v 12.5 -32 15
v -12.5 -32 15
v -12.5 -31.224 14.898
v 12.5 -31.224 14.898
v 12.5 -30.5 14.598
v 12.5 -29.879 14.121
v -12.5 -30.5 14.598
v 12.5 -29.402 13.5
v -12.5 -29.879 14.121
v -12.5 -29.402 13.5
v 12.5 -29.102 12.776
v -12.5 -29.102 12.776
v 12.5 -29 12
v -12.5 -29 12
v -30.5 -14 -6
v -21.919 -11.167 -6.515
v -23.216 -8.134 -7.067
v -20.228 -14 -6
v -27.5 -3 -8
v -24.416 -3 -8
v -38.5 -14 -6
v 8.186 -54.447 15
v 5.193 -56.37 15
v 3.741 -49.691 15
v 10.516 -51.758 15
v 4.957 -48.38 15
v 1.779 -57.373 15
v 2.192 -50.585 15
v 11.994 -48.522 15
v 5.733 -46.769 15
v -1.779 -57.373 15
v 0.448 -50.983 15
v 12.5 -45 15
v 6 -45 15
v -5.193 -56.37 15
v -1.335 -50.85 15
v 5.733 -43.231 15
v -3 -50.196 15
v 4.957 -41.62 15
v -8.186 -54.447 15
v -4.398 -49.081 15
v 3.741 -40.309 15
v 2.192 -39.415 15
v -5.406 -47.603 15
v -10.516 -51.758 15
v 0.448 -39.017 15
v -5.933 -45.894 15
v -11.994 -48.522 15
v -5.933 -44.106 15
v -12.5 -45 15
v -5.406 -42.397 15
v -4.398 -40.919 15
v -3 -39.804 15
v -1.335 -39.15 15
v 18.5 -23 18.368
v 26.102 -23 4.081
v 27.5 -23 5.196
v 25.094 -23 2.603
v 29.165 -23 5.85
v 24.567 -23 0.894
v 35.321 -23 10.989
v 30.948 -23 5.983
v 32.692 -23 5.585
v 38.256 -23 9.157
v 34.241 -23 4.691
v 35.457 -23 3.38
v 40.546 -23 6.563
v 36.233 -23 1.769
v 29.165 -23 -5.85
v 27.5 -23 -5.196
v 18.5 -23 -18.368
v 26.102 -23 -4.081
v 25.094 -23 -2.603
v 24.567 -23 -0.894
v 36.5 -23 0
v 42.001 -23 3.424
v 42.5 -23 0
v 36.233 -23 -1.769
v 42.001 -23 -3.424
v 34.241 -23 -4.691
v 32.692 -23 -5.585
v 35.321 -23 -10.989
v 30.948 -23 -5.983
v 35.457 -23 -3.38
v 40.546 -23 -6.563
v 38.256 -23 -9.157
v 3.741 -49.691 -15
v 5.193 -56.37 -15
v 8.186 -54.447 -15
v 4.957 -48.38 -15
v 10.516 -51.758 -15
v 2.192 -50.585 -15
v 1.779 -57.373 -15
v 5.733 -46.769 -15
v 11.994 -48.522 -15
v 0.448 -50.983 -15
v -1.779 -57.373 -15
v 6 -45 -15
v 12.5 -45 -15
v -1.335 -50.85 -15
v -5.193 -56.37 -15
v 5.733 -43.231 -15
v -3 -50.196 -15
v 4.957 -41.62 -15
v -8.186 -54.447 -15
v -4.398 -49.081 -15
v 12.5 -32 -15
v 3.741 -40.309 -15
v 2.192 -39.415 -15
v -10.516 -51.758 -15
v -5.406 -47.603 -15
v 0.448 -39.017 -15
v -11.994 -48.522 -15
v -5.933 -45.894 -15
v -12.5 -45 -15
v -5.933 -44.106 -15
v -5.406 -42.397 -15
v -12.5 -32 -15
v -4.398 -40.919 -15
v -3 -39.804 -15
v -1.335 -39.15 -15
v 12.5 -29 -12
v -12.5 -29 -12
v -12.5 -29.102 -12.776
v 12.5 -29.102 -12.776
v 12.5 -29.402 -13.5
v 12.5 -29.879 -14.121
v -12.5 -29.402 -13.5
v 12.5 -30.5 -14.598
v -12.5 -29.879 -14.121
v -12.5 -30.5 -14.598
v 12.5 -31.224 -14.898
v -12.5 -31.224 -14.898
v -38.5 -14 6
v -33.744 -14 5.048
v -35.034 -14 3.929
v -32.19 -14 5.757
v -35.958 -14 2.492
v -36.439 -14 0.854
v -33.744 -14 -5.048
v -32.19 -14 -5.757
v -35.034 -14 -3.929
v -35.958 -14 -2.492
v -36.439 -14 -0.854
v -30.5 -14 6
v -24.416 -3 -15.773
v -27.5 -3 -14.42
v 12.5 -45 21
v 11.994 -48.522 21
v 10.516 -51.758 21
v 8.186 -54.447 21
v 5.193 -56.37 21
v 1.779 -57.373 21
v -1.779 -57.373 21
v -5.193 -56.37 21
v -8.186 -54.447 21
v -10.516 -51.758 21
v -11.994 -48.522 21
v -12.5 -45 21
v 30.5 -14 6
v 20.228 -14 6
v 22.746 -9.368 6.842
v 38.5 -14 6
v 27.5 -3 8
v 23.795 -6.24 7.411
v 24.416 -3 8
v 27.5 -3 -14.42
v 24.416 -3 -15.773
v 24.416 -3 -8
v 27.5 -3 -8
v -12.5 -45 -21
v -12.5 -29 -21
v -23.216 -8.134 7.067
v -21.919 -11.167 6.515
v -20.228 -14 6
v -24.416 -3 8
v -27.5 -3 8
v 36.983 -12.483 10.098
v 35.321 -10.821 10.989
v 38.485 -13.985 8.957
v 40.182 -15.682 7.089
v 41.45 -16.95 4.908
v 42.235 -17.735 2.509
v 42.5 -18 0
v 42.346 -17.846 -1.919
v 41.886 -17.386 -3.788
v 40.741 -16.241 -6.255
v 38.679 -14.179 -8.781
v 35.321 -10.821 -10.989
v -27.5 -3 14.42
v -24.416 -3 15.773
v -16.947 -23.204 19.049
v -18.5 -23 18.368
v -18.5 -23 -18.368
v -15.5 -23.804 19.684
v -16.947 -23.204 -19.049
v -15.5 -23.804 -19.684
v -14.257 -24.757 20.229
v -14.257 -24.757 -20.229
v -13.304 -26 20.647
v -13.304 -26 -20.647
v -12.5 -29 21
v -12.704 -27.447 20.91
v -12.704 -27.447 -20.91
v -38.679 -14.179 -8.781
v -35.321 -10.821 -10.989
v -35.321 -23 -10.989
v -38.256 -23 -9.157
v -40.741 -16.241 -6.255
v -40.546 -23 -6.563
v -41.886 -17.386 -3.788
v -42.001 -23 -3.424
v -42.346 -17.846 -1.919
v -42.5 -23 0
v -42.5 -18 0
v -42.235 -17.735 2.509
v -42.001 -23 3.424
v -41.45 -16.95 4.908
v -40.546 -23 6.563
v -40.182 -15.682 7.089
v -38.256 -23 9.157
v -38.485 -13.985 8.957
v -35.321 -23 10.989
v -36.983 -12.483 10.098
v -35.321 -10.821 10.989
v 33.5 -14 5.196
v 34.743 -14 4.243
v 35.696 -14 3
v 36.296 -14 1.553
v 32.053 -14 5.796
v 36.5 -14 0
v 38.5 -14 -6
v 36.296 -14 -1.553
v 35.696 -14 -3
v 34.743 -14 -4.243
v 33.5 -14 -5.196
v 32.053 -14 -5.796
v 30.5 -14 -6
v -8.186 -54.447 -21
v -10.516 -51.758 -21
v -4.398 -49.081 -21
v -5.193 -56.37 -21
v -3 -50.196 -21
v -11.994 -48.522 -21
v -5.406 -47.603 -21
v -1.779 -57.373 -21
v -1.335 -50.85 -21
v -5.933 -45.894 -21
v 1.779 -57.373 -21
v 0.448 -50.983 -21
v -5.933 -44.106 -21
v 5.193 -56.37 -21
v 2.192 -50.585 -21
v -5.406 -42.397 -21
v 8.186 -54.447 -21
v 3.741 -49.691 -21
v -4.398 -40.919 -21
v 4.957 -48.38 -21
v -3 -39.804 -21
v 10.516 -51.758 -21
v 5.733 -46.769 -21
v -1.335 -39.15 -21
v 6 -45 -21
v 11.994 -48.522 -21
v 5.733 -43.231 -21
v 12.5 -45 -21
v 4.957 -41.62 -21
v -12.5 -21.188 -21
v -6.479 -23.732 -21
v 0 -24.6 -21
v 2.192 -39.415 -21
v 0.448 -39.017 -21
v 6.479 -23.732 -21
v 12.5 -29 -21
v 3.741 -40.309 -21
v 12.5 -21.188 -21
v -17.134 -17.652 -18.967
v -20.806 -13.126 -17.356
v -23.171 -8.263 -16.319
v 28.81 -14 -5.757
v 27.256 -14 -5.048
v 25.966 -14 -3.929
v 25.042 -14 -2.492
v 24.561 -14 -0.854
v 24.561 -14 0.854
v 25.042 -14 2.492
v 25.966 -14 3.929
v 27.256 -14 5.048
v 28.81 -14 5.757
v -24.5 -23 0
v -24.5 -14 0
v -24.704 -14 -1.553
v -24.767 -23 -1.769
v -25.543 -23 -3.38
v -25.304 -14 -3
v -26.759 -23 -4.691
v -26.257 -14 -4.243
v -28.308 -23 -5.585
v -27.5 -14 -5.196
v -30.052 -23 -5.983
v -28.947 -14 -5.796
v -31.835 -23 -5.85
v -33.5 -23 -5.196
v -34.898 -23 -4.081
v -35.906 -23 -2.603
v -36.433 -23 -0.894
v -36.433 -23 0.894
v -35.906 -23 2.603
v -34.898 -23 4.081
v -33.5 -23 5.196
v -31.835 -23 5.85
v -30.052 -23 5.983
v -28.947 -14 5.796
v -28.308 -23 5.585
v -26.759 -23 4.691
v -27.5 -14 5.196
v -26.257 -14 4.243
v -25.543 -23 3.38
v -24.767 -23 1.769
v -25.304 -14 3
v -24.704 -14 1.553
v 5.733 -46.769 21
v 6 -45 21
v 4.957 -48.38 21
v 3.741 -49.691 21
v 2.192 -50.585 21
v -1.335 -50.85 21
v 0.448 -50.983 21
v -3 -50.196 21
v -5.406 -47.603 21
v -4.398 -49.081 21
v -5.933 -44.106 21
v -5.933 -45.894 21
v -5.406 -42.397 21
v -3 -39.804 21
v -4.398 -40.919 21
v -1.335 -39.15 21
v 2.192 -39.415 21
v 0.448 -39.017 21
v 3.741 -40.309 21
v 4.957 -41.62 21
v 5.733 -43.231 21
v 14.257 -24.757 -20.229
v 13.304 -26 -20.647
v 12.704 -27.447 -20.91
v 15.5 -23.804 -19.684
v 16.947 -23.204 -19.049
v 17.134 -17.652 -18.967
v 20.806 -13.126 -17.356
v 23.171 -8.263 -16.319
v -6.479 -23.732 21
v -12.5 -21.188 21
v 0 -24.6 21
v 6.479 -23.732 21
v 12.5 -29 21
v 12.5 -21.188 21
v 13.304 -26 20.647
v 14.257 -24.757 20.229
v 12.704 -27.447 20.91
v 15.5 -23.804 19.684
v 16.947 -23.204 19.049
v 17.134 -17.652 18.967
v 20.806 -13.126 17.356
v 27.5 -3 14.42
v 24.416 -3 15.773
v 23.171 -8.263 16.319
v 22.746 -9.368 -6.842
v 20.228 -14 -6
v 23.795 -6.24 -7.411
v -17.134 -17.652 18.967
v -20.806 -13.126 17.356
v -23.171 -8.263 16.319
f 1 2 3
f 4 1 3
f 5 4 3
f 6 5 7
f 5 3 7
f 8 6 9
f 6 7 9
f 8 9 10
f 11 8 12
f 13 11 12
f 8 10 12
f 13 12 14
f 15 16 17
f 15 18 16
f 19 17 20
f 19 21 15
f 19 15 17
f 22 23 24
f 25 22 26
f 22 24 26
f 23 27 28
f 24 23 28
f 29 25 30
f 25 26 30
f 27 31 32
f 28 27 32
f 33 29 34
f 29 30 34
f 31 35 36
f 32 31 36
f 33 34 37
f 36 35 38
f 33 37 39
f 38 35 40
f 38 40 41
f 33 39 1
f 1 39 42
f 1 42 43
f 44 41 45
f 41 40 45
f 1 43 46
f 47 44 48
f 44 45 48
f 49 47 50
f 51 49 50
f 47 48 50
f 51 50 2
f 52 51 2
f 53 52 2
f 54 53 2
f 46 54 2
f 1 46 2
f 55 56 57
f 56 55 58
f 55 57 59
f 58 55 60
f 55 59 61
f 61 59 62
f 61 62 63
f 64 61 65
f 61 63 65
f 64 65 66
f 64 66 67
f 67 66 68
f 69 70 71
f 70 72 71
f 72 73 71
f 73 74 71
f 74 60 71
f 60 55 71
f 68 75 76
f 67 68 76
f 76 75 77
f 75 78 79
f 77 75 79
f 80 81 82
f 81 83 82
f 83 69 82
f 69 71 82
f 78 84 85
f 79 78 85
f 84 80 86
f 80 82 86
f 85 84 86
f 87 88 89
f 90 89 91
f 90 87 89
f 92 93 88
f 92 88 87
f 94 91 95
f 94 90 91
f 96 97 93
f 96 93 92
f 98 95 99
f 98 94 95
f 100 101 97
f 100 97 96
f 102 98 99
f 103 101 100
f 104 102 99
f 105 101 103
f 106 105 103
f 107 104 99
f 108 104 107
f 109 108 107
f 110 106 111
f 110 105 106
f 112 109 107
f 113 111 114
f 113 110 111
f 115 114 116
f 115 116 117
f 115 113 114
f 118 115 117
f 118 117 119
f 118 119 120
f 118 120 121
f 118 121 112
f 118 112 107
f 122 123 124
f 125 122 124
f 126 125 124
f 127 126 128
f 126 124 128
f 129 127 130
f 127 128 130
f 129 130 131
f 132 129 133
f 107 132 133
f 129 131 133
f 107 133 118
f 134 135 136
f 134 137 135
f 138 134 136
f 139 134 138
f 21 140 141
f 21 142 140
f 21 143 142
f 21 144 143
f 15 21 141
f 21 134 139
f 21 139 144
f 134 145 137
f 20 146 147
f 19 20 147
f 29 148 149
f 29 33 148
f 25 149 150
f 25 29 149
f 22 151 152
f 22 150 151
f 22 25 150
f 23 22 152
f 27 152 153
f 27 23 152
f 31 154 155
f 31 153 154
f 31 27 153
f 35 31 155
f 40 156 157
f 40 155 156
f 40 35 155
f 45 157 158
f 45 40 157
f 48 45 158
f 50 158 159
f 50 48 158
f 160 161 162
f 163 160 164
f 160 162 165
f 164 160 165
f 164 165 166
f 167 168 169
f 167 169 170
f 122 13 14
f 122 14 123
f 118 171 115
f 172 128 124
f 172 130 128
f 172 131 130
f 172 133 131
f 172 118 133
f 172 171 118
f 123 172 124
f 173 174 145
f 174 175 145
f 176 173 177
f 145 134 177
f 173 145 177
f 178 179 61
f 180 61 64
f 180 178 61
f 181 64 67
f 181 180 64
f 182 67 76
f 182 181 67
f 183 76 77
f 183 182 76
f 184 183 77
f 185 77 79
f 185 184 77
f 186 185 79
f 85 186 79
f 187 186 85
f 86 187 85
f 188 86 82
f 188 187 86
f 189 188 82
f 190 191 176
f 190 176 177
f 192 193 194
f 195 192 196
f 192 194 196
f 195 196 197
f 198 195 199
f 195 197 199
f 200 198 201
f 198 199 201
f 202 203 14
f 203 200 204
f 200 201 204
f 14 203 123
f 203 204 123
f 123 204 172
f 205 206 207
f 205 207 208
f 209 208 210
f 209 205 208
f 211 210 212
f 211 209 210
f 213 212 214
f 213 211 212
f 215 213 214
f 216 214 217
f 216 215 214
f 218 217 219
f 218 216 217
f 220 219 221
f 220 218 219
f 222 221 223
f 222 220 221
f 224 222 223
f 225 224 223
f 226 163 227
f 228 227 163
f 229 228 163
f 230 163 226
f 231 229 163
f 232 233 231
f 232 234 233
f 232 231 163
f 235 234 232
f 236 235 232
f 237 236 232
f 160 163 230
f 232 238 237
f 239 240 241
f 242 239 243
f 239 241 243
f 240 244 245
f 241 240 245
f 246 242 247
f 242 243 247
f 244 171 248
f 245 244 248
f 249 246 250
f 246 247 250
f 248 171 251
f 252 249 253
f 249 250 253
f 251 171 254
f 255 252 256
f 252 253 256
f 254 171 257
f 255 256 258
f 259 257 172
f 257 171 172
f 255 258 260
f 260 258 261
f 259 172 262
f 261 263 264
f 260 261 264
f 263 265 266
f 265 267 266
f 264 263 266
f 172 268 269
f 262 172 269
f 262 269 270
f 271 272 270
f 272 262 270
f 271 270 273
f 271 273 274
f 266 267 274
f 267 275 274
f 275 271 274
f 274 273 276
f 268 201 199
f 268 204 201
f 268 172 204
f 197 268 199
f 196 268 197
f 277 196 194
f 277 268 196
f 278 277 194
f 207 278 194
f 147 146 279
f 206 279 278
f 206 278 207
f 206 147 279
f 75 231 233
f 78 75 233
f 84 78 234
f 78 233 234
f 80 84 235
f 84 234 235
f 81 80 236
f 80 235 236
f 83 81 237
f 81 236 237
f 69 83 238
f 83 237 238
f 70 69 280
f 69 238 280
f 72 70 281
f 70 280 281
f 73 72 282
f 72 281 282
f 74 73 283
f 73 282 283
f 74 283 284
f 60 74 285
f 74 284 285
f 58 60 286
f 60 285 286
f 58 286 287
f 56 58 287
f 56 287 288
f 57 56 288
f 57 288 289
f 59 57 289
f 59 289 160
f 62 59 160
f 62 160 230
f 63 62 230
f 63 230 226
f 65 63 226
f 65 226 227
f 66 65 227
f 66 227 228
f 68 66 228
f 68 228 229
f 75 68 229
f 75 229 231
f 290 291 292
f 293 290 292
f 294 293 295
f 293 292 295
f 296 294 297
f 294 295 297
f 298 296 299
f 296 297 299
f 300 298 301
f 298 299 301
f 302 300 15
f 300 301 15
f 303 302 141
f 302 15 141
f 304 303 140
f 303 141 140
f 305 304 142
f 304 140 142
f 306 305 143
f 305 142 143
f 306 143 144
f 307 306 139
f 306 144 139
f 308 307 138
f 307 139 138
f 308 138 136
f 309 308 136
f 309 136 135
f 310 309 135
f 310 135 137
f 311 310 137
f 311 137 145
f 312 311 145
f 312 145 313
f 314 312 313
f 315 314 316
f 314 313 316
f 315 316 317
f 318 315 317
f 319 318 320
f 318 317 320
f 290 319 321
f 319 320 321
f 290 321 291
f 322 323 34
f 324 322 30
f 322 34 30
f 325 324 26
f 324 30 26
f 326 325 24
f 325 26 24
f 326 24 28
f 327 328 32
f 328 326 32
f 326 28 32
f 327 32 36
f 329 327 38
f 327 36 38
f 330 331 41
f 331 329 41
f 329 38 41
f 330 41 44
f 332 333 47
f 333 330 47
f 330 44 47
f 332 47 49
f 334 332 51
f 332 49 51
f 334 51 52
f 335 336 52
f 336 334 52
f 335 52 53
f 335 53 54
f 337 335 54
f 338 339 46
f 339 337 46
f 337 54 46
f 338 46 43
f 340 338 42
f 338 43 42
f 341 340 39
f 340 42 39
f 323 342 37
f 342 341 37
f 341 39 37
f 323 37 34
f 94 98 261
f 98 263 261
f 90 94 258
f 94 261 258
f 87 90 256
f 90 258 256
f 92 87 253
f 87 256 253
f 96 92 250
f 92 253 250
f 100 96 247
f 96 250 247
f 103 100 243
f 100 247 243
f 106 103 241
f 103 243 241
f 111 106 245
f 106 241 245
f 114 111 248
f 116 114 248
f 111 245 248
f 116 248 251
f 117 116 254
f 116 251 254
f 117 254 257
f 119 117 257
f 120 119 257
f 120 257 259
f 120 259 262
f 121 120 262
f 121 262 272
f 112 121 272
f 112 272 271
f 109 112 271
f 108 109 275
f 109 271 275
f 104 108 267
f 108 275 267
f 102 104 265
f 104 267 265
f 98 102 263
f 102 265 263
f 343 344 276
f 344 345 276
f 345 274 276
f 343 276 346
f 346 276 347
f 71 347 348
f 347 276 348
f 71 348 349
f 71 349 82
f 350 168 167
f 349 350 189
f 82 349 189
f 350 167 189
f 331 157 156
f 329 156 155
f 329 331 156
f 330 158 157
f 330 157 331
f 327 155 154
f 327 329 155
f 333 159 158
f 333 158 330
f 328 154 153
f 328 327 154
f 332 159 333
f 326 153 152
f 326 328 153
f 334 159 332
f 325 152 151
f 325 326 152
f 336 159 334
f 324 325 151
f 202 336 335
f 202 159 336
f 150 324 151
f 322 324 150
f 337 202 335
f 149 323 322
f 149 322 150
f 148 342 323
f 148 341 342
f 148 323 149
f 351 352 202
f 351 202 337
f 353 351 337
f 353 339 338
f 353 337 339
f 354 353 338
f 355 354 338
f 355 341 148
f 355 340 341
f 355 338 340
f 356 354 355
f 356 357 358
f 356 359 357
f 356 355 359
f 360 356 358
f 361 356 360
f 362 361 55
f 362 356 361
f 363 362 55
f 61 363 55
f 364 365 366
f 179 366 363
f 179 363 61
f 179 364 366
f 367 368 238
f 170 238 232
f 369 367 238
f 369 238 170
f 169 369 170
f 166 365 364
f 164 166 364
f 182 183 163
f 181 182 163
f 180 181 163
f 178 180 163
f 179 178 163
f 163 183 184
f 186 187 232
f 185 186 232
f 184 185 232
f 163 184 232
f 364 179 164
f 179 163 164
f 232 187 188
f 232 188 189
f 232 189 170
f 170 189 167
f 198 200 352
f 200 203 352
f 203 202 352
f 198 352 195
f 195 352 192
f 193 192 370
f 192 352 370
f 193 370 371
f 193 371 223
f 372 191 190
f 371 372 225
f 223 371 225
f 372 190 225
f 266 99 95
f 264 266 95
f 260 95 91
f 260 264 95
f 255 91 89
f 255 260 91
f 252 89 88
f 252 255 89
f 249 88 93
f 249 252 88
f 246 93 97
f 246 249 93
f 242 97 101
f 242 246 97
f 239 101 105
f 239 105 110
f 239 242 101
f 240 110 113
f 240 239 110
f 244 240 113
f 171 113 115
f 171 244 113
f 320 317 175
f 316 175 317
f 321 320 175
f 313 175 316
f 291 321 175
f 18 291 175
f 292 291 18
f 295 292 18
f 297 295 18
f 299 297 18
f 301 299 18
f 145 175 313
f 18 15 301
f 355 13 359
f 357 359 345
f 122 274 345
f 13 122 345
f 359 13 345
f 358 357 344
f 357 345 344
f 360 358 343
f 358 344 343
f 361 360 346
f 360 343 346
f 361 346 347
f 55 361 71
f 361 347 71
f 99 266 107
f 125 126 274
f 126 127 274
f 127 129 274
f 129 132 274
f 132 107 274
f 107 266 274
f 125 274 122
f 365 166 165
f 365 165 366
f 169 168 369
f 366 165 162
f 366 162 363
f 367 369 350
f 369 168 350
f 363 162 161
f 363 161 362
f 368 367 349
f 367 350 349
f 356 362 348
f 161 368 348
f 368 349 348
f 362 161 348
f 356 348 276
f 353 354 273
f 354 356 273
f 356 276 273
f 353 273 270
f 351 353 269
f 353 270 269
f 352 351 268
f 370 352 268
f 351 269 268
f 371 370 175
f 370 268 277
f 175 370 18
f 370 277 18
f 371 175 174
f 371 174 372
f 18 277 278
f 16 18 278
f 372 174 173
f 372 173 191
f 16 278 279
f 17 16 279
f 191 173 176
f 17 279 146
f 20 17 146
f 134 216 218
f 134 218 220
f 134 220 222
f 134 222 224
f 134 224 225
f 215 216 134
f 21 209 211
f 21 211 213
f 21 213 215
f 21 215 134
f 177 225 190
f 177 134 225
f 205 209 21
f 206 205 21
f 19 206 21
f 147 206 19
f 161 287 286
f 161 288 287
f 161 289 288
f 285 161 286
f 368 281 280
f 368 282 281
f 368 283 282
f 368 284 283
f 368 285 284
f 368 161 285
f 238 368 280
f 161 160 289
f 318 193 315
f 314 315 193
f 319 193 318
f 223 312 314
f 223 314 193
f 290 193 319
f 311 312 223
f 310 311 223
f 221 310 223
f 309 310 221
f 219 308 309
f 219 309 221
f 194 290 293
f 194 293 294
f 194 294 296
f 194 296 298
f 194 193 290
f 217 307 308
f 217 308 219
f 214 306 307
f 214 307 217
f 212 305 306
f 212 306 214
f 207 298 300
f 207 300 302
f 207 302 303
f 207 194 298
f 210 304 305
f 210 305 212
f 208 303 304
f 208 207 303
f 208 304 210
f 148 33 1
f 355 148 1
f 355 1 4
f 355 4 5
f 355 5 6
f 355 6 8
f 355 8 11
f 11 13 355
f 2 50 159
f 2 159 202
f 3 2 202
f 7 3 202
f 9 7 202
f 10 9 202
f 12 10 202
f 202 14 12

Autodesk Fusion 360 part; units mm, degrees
sketch "Sketch1" plane through (0, 0, 0) normal (0, 0, 1) x (1, 0, 0)
  line L0 (0, 0) -> (100, 0) construction
  line L1 (0, 0) -> (-100, 0) construction
  line L2 (0, -3) -> (100, -3) construction
  line L3 (0, -3) -> (-100, -3) construction
  circle A0 centre (0, 0) radius 24.6 construction
  circle A1 centre (0, 0) radius 28.5 construction
  line L4 (0, -23) -> (100, -23) construction
  line L5 (0, -23) -> (-100, -23) construction
  line L6 (0, 0) -> (0, -150) construction
  line L7 (0, 0) -> (0, 150) construction
  line L8 (-30.5, 0) -> (-30.5, -150) construction
  line L9 (-30.5, 0) -> (-30.5, 150) construction
  line L10 (30.5, 0) -> (30.5, 150) construction
  line L11 (30.5, 0) -> (30.5, -150) construction
  line L12 (-30.5, -23) -> (-42.5, -23)
  line L13 (-42.5, -23) -> (-42.5, -18)
  line L14 (-42.5, -18) -> (-12.5, -18) construction
  line L15 (-42.5, -18) -> (-27.5, -3)
  line L16 (-24.5998, -0.0998) -> (-24.5, 0)
  line L17 (-24.4164, -3) -> (-27.5, -3)
  line L18 (24.4164, -3) -> (27.5, -3)
  line L19 (42.5, -18) -> (27.5, -3)
  line L20 (30.5, -23) -> (42.5, -23)
  line L21 (42.5, -23) -> (42.5, -18)
  arc A2 (-24.4164, -3) -> (24.4164, -3) centre (0, 0) ccw
  line L22 (0, -45) -> (-100, -45) construction
  line L23 (0, -45) -> (100, -45) construction
  circle A3 centre (0, -45) radius 6
  circle A4 centre (0, -45) radius 12.5 construction
  line L24 (-12.5, -45) -> (-12.5, -29)
  line L25 (-30.5, -23) -> (-18.5, -23)
  line L26 (12.5, -45) -> (12.5, -29)
  line L27 (30.5, -23) -> (18.5, -23)
  arc A5 (-12.5, -45) -> (12.5, -45) centre (0, -45) ccw
  arc A6 (-12.5, -29) -> (-18.5, -23) centre (-18.5, -29) ccw
  arc A7 (18.5, -23) -> (12.5, -29) centre (18.5, -29) ccw
  dimension "d4" = 3
  dimension "d5" = 49.2
  dimension "d6" = 57
  dimension "d7" = 23
  dimension "d10" = 30.5
  dimension "d11" = 30.5
  dimension "d12" = 12
  dimension "d13" = 5
  dimension "d14" = 45
  dimension "d16" = 24.6
  dimension "d17" = 45
  dimension "d18" = 12
  dimension "d19" = 25
  dimension "d20" = 6
  dimension "d21" = 6
extrude "Extrude1" add sketch "Sketch1" along normal mid plane 42
sketch "Sketch2" plane through (0, 0, 0) normal (0, 1, 0) x (1, 0, 0)
  line L0 (-24.4164, 21) -> (24.4164, 21) construction
  line L1 (-27.5, 21) -> (-24.4164, 21) construction
  line L2 (-42.5, 21) -> (-27.5, 21) construction
  line L3 (24.4164, 21) -> (27.5, 21) construction
  line L4 (27.5, 21) -> (42.5, 21) construction
  line L5 (6, -21) -> (-6, -21) construction
  line L6 (18.5, -21) -> (42.5, -21) construction
  line L7 (42.5, -21) -> (27.5, -21) construction
  line L8 (27.5, -21) -> (24.4164, -21) construction
  line L9 (24.4164, -21) -> (-24.4164, -21) construction
  line L10 (-24.4164, -21) -> (-27.5, -21) construction
  line L11 (-27.5, -21) -> (-42.5, -21) construction
  line L12 (-42.5, -21) -> (-18.5, -21) construction
  line L13 (-12.5, -21) -> (-18.5, -21) construction
  line L14 (-12.5, -21) -> (12.5, -21) construction
  line L15 (18.5, -21) -> (12.5, -21) construction
  line L16 (42.5, 21) -> (42.5, -21) construction
  line L17 (42.5, -21) -> (42.5, 21) construction
  line L18 (-42.5, 21) -> (-42.5, -21) construction
  line L19 (-42.5, -21) -> (-42.5, 21) construction
  circle A0 centre (-30.5, 0) radius 12 construction
  circle A1 centre (30.5, 0) radius 12 construction
  line L20 (0, 21) -> (0, -21) construction
  line L21 (-12.5, 21) -> (-12.5, -21) construction
  line L22 (12.5, 21) -> (12.5, -21) construction
  line L23 (-12.5, 21) -> (12.5, 21)
  line L24 (-12.5, -21) -> (12.5, -21)
  line L25 (12.5, -21) -> (35.3207, -10.9891)
  line L26 (12.5, 21) -> (35.3207, 10.9891)
  line L27 (-12.5, 21) -> (-35.3207, 10.9891)
  line L28 (-12.5, -21) -> (-35.3207, -10.9891)
  arc A2 (35.3207, -10.9891) -> (35.3207, 10.9891) centre (30.5, 0) ccw
  arc A3 (-35.3207, 10.9891) -> (-35.3207, -10.9891) centre (-30.5, 0) ccw
  line L29 (12.5, 21) -> (42.5, 21)
  line L30 (12.5, -21) -> (42.5, -21)
  line L31 (42.5, -21) -> (42.5, 21)
  line L32 (-42.5, 21) -> (-12.5, 21)
  line L33 (-42.5, -21) -> (-12.5, -21)
  line L34 (-42.5, -21) -> (-42.5, 21)
  circle A4 centre (30.5, 0) radius 6
  circle A5 centre (-30.5, 0) radius 6
  dimension "d24" = 24
  dimension "d25" = 24
  dimension "d26" = 12.5
  dimension "d27" = 12.5
  dimension "d28" = 12
  dimension "d29" = 12
extrude "Extrude2" cut sketch "Sketch2" against normal through all contours L27 A3 L32 L34 | L26 A2 L29 L31 | L28 A3 L33 L34 | L25 A2 L30 L31 | A4 | A5
sketch "Sketch3" plane through (0, 0, 0) normal (1, 0, 0) x (0, 0, -1)
  line L0 (-21, -51) -> (-21, -39) construction
  line L1 (-21, -29) -> (-21, -21.1875) construction
  line L2 (-21, -24.6) -> (-21, -21.1875) construction
  line L3 (-21, -21.1875) -> (-21, -29) construction
  line L4 (-21, -29) -> (-21, -45) construction
  line L5 (-21, -45) -> (-21, -57.5) construction
  line L6 (-21, -45) -> (-21, -29) construction
  line L7 (21, -21.1875) -> (21, -29) construction
  line L8 (21, -29) -> (21, -45) construction
  line L9 (21, -57.5) -> (21, -45) construction
  line L10 (21, -45) -> (21, -29) construction
  line L11 (21, -29) -> (21, -21.1875) construction
  line L12 (21, -21.1875) -> (21, -24.6) construction
  line L13 (21, -39) -> (21, -51) construction
  line L14 (21, -45) -> (-21, -45) construction
  line L15 (-21, -45) -> (-21, -57.5) construction
  line L16 (-21, -45) -> (21, -45) construction
  line L17 (21, -57.5) -> (21, -45) construction
  line L18 (21, -45) -> (-21, -45) construction
  line L19 (-21, -45) -> (-21, -29) construction
  line L20 (-21, -29) -> (21, -29) construction
  line L21 (21, -29) -> (21, -45) construction
  line L22 (-5.1962, -3) -> (-14.4199, -3) construction
  line L23 (14.4199, -3) -> (5.1962, -3) construction
  line L24 (-5.1962, -3) -> (5.1962, -3) construction
  arc A0 (-5.1962, -3) -> (5.1962, -3) centre (0, -6) ccw construction
  line L25 (-5.1962, -3) -> (5.1962, -3) construction
  line L26 (6, -23) -> (-6, -23) construction
  line L27 (0, 0) -> (0, -75) construction
  line L28 (-6, 0) -> (-6, -75) construction
  line L29 (-8, 0) -> (-8, -75) construction
  line L30 (6, 0) -> (6, -75) construction
  line L31 (8, 0) -> (8, -75) construction
  line L32 (21, -57.5) -> (-21, -57.5) construction
  line L33 (21, -57.5) -> (15, -57.5)
  line L34 (-21, -57.5) -> (-15, -57.5)
  line L35 (0, 0) -> (40, 0) construction
  line L36 (0, 0) -> (-40, 0) construction
  line L37 (0, -28.5) -> (-40, -28.5) construction
  line L38 (15, -57.5) -> (15, -32)
  line L39 (-15, -57.5) -> (-15, -32)
  line L40 (-12, -29) -> (12, -29)
  line L41 (15, -57.5) -> (-15, -57.5)
  arc A1 (15, -32) -> (12, -29) centre (12, -32) ccw
  arc A2 (-12, -29) -> (-15, -32) centre (-12, -32) ccw
  line L42 (0, -3) -> (-8, -3)
  line L43 (0, -3) -> (8, -3)
  line L44 (14.4199, -14) -> (5.1962, -14) construction
  line L45 (-5.1962, -14) -> (5.1962, -14) construction
  line L46 (-5.1962, -14) -> (-14.4199, -14) construction
  line L47 (6, -14) -> (8, -3)
  line L48 (-6, -14) -> (-8, -3)
  line L49 (-6, -14) -> (6, -14)
  point P0 (-15.7726, -3)
  point P1 (15.7726, -3)
  point P2 (21, -21.1875)
  point P3 (-21, -21.1875)
  dimension "d32" = 6
  dimension "d33" = 8
  dimension "d34" = 6
  dimension "d35" = 8
  dimension "d36" = 6
  dimension "d37" = 6
  dimension "d41" = 3
  dimension "d42" = 3
  dimension "d43" = 8
  dimension "d44" = 11
extrude "Extrude3" cut sketch "Sketch3" along normal through all and the other way through all
equation "d5 = ( 24.6 * 2 ) * 1 mm"
equation "d6 = ( 28.5 * 2 ) * 1 mm"
